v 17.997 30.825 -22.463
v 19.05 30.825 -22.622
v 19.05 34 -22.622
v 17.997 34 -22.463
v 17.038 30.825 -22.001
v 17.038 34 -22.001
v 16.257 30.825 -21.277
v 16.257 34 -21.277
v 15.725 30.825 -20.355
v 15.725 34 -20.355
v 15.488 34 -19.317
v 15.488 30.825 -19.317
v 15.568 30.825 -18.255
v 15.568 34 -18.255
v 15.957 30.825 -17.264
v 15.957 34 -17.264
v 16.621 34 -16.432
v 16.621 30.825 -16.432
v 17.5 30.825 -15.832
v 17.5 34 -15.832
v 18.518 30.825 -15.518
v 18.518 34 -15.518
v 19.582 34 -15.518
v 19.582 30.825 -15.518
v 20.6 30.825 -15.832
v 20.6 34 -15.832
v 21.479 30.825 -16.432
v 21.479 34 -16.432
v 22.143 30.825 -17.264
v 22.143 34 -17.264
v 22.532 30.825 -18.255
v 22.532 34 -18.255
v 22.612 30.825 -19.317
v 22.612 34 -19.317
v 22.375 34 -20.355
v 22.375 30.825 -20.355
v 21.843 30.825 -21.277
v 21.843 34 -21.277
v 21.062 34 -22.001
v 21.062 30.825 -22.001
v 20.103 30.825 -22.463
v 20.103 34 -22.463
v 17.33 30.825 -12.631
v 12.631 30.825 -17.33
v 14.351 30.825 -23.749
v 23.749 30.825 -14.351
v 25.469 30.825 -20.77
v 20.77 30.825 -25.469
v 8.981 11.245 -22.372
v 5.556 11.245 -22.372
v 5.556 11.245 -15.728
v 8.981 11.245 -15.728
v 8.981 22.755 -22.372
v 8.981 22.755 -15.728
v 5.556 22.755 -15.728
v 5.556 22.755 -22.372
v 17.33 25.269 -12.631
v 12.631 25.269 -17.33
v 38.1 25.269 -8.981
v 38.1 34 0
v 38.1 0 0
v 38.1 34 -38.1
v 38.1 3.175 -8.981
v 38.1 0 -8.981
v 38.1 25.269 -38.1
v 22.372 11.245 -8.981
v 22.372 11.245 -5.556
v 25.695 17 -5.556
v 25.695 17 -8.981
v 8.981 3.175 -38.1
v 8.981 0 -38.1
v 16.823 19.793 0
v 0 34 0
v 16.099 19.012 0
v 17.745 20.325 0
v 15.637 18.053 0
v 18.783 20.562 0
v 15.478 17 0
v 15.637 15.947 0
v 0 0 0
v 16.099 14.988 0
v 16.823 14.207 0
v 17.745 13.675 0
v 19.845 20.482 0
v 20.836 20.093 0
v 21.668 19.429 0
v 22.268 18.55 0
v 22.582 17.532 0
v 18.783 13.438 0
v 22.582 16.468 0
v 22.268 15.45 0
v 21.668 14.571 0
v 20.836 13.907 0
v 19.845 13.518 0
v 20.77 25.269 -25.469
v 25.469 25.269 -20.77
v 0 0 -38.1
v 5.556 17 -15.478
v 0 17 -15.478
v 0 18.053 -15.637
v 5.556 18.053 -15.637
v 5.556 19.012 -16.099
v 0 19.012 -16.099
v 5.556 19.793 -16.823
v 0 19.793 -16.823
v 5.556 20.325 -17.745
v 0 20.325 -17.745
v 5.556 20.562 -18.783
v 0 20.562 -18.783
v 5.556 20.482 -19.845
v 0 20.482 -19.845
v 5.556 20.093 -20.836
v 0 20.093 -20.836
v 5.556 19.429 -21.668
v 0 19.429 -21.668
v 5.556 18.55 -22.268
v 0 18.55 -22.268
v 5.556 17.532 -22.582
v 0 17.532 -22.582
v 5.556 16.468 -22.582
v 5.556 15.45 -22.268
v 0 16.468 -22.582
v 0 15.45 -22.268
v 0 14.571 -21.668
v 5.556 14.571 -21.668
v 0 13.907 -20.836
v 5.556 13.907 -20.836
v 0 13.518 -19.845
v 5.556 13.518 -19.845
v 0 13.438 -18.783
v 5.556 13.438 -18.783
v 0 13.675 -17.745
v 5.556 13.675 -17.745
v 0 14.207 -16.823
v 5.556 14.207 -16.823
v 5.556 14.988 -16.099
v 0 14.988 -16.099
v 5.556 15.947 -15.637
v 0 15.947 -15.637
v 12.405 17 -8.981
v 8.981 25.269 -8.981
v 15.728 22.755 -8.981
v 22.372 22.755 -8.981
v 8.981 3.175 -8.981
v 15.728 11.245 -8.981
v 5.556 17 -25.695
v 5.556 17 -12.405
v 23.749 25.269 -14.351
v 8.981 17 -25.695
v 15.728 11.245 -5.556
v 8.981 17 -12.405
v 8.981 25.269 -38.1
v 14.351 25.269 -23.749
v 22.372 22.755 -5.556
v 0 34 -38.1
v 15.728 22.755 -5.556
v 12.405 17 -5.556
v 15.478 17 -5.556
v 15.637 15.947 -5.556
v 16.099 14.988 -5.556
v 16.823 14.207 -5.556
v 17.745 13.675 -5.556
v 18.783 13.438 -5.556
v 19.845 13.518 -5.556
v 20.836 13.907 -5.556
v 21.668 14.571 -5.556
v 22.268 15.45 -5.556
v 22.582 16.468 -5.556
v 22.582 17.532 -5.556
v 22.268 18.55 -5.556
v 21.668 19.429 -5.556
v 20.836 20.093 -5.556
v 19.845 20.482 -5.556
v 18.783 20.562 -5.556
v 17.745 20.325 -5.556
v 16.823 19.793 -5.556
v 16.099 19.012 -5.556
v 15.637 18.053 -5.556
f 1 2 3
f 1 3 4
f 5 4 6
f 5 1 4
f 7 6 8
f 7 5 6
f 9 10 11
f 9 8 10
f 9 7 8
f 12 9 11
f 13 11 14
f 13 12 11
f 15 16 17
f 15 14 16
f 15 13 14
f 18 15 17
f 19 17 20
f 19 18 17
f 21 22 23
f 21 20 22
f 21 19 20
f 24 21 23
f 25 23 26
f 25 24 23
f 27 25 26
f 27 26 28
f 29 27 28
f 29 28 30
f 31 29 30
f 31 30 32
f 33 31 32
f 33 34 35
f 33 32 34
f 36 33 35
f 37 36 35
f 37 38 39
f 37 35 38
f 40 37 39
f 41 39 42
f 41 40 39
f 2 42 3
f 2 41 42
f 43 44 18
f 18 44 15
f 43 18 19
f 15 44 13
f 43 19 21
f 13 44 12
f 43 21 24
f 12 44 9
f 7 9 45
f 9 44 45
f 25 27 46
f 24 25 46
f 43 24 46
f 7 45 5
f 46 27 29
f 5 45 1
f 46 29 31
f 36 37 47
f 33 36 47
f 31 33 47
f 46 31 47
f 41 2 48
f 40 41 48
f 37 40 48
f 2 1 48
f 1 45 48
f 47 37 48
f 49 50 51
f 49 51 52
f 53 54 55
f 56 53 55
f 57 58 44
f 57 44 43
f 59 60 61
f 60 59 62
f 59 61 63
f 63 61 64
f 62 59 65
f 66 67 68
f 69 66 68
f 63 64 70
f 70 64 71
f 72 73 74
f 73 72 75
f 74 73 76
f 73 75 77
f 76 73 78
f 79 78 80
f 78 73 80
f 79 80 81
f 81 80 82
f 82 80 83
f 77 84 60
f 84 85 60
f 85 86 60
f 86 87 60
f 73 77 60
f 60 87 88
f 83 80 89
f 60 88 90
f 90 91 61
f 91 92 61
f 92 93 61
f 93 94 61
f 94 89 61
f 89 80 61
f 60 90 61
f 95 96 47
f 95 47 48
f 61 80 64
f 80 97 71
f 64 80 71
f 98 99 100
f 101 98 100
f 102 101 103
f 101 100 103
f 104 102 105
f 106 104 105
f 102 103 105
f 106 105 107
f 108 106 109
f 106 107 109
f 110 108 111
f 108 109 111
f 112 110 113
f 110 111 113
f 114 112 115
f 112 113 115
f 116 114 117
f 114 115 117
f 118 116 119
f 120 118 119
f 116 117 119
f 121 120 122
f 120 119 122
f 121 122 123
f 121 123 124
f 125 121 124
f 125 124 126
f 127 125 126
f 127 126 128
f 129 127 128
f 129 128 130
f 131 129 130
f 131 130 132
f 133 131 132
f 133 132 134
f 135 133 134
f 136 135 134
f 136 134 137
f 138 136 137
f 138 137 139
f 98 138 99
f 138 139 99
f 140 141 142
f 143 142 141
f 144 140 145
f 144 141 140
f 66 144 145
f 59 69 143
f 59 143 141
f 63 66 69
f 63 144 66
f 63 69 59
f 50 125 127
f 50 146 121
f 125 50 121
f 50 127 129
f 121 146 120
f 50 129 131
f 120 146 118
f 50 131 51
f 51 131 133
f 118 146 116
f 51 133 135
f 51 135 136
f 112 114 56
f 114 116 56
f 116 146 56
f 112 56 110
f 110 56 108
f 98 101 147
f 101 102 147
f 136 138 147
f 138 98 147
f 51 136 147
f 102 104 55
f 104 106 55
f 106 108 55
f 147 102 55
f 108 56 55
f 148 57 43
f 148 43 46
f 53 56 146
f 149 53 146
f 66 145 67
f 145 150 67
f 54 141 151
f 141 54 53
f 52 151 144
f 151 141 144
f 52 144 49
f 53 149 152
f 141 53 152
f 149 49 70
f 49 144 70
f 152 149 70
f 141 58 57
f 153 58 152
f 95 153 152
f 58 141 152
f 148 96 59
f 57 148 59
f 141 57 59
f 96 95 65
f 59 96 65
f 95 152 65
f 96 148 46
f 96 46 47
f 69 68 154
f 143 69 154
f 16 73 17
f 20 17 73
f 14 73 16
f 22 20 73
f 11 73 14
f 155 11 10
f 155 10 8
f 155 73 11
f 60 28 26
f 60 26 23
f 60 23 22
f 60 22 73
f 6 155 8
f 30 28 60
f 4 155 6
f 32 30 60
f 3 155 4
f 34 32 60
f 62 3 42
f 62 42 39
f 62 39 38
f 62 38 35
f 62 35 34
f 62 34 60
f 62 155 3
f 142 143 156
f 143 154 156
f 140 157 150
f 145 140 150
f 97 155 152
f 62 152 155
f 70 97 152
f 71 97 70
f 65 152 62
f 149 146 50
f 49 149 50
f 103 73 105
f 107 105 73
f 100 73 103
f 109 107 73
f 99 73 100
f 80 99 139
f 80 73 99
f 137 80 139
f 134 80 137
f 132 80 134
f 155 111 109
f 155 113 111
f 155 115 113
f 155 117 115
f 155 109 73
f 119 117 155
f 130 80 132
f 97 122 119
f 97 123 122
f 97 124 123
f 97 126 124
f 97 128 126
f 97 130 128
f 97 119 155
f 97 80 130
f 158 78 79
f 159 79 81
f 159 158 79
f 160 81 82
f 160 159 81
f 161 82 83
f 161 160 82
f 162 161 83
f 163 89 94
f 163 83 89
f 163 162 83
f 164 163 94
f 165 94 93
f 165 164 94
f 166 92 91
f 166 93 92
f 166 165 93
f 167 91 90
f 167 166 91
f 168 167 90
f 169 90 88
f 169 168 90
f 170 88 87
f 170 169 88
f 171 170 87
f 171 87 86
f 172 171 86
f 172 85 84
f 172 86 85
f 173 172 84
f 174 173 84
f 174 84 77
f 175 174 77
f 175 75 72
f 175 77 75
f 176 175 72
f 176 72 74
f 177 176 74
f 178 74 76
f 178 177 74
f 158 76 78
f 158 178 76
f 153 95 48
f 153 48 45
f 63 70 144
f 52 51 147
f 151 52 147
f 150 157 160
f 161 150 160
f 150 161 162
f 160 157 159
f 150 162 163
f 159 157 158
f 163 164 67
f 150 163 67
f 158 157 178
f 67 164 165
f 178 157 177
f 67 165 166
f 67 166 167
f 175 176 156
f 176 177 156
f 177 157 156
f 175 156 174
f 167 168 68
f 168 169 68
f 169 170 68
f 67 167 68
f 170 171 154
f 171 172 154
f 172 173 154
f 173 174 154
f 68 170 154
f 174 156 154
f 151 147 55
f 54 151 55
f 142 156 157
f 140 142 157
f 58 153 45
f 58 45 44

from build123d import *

# Parameters (mm, degrees)
SKETCH1_W                    = 38.1
SKETCH1_H                    = 38.1
MAIN_BODY_DEPTH              = 34
F_9_32_RIGHT_RAIL_DEPTH      = 64.712008287
F_9_32_RIGHT_RAIL_DEPTH_BACK = 5.55625
SKETCH3_R                    = 3.571875
SKETCH4_R                    = 3.571875
F_9_32_LEFT_RAIL_DEPTH       = 5.55625
F_9_32_TOPPER_DEPTH          = 64.712008287
F_9_32_TOPPER_DEPTH_BACK     = 10
SKETCH8_R                    = 3.571875
CUT_EXTRUDE3_START           = -5.55625
CUT_EXTRUDE3_DEPTH           = 32.54375
CUT_EXTRUDE4_START           = -5.55625
CUT_EXTRUDE4_DEPTH           = 32.54375
CUT_EXTRUDE12_START          = -30.825
CUT_EXTRUDE12_OUTLINE_W      = 29.119345377
CUT_EXTRUDE12_OUTLINE_H      = 29.119345377
CUT_EXTRUDE12_DEPTH          = 22.09375
CUT_EXTRUDE15_START          = -17
CUT_EXTRUDE15_DEPTH          = 13.825
CUT_EXTRUDE16_REACH          = 65.712


# Read off the part's stored shape, not the designer's step: Cut-Extrude12
with BuildPart() as part:
    # Sketch1 → Main Body (new body)
    with BuildSketch(Plane(origin=(0, 0, 0), x_dir=(1, 0, 0), z_dir=(0, 1, 0))):
        with Locations((19.05, 19.05)):
            Rectangle(SKETCH1_W, SKETCH1_H)
    extrude(amount=MAIN_BODY_DEPTH)

    # Sketch3 → 9/32 Right Rail (cut, two sides: drawn at the far end of the back side and taken through both)
    with BuildSketch(Plane.XY.offset(-F_9_32_RIGHT_RAIL_DEPTH_BACK)):
        with Locations(Location((19.05, 17, 0), (0, 0, 180))):
            Circle(SKETCH3_R)
    extrude(amount=F_9_32_RIGHT_RAIL_DEPTH + F_9_32_RIGHT_RAIL_DEPTH_BACK, mode=Mode.SUBTRACT)

    # Sketch4 → 9/32 Left Rail (cut)
    with BuildSketch(Plane.ZY):
        with Locations((-19.05, 17)):
            Circle(SKETCH4_R)
    extrude(amount=-F_9_32_LEFT_RAIL_DEPTH, mode=Mode.SUBTRACT)

    # Sketch8 → 9/32 Topper (cut, two sides: drawn at the far end of the back side and taken through both)
    with BuildSketch(Plane(origin=(0, 34, 0), x_dir=(1, 0, 0), z_dir=(0, 1, 0)).offset(-F_9_32_TOPPER_DEPTH_BACK)):
        with Locations(Location((19.05, 19.05, 0), (0, 0, 90))):
            Circle(SKETCH8_R)
    extrude(amount=F_9_32_TOPPER_DEPTH + F_9_32_TOPPER_DEPTH_BACK, mode=Mode.SUBTRACT)

    # Sketch9 → Cut-Extrude3 (cut)
    with BuildSketch(Plane.ZY.offset(CUT_EXTRUDE3_START)):
        Polygon((-22.372470377, 22.7546875), (-25.694940754, 17), (-22.372470377, 11.2453125), (-15.727529623, 11.2453125), (-12.405059246, 17), (-15.727529623, 22.7546875), align=None)
    extrude(amount=-CUT_EXTRUDE3_DEPTH, mode=Mode.SUBTRACT)

    # Sketch10 → Cut-Extrude4 (cut)
    with BuildSketch(Plane.XY.offset(CUT_EXTRUDE4_START)):
        Polygon((15.727529623, 22.7546875), (12.405059246, 17), (15.727529623, 11.2453125), (22.372470377, 11.2453125), (25.694940754, 17), (22.372470377, 22.7546875), align=None)
    extrude(amount=-CUT_EXTRUDE4_DEPTH, mode=Mode.SUBTRACT)

    # Cut-Extrude12 outline → Cut-Extrude12 (cut)
    with BuildSketch(Plane(origin=(0, 34, 0), x_dir=(1, 0, 0), z_dir=(0, 1, 0)).offset(CUT_EXTRUDE12_START)):
        with Locations((23.540327312, 23.540327312)):
            Rectangle(CUT_EXTRUDE12_OUTLINE_W, CUT_EXTRUDE12_OUTLINE_H)
    extrude(amount=CUT_EXTRUDE12_DEPTH, mode=Mode.SUBTRACT)

    # Sketch14 → Cut-Extrude15 (cut)
    with BuildSketch(Plane(origin=(0, 34, 0), x_dir=(1, 0, 0), z_dir=(0, 1, 0)).offset(CUT_EXTRUDE15_START)):
        Polygon((23.748682668, 14.351317332), (25.468519889, 20.769837221), (20.769837221, 25.468519889), (14.351317332, 23.748682668), (12.631480111, 17.330162779), (17.330162779, 12.631480111), align=None)
    extrude(amount=CUT_EXTRUDE15_DEPTH, mode=Mode.SUBTRACT)

    # Sketch15 → Cut-Extrude16 (cut, up to next)
    with BuildSketch(Plane.XZ, mode=Mode.PRIVATE) as cut_extrude16_sk1:
        Polygon((38.1, -8.980654623), (8.980654623, -38.1), (38.1, -38.1), align=None)
    cut_extrude16_tool1 = extrude(cut_extrude16_sk1.sketch, amount=-CUT_EXTRUDE16_REACH, mode=Mode.PRIVATE) & part.part
    add(cut_extrude16_tool1.solids().sort_by_distance((28.393552, 0, -28.393552))[0], mode=Mode.SUBTRACT)


solid = part.part
